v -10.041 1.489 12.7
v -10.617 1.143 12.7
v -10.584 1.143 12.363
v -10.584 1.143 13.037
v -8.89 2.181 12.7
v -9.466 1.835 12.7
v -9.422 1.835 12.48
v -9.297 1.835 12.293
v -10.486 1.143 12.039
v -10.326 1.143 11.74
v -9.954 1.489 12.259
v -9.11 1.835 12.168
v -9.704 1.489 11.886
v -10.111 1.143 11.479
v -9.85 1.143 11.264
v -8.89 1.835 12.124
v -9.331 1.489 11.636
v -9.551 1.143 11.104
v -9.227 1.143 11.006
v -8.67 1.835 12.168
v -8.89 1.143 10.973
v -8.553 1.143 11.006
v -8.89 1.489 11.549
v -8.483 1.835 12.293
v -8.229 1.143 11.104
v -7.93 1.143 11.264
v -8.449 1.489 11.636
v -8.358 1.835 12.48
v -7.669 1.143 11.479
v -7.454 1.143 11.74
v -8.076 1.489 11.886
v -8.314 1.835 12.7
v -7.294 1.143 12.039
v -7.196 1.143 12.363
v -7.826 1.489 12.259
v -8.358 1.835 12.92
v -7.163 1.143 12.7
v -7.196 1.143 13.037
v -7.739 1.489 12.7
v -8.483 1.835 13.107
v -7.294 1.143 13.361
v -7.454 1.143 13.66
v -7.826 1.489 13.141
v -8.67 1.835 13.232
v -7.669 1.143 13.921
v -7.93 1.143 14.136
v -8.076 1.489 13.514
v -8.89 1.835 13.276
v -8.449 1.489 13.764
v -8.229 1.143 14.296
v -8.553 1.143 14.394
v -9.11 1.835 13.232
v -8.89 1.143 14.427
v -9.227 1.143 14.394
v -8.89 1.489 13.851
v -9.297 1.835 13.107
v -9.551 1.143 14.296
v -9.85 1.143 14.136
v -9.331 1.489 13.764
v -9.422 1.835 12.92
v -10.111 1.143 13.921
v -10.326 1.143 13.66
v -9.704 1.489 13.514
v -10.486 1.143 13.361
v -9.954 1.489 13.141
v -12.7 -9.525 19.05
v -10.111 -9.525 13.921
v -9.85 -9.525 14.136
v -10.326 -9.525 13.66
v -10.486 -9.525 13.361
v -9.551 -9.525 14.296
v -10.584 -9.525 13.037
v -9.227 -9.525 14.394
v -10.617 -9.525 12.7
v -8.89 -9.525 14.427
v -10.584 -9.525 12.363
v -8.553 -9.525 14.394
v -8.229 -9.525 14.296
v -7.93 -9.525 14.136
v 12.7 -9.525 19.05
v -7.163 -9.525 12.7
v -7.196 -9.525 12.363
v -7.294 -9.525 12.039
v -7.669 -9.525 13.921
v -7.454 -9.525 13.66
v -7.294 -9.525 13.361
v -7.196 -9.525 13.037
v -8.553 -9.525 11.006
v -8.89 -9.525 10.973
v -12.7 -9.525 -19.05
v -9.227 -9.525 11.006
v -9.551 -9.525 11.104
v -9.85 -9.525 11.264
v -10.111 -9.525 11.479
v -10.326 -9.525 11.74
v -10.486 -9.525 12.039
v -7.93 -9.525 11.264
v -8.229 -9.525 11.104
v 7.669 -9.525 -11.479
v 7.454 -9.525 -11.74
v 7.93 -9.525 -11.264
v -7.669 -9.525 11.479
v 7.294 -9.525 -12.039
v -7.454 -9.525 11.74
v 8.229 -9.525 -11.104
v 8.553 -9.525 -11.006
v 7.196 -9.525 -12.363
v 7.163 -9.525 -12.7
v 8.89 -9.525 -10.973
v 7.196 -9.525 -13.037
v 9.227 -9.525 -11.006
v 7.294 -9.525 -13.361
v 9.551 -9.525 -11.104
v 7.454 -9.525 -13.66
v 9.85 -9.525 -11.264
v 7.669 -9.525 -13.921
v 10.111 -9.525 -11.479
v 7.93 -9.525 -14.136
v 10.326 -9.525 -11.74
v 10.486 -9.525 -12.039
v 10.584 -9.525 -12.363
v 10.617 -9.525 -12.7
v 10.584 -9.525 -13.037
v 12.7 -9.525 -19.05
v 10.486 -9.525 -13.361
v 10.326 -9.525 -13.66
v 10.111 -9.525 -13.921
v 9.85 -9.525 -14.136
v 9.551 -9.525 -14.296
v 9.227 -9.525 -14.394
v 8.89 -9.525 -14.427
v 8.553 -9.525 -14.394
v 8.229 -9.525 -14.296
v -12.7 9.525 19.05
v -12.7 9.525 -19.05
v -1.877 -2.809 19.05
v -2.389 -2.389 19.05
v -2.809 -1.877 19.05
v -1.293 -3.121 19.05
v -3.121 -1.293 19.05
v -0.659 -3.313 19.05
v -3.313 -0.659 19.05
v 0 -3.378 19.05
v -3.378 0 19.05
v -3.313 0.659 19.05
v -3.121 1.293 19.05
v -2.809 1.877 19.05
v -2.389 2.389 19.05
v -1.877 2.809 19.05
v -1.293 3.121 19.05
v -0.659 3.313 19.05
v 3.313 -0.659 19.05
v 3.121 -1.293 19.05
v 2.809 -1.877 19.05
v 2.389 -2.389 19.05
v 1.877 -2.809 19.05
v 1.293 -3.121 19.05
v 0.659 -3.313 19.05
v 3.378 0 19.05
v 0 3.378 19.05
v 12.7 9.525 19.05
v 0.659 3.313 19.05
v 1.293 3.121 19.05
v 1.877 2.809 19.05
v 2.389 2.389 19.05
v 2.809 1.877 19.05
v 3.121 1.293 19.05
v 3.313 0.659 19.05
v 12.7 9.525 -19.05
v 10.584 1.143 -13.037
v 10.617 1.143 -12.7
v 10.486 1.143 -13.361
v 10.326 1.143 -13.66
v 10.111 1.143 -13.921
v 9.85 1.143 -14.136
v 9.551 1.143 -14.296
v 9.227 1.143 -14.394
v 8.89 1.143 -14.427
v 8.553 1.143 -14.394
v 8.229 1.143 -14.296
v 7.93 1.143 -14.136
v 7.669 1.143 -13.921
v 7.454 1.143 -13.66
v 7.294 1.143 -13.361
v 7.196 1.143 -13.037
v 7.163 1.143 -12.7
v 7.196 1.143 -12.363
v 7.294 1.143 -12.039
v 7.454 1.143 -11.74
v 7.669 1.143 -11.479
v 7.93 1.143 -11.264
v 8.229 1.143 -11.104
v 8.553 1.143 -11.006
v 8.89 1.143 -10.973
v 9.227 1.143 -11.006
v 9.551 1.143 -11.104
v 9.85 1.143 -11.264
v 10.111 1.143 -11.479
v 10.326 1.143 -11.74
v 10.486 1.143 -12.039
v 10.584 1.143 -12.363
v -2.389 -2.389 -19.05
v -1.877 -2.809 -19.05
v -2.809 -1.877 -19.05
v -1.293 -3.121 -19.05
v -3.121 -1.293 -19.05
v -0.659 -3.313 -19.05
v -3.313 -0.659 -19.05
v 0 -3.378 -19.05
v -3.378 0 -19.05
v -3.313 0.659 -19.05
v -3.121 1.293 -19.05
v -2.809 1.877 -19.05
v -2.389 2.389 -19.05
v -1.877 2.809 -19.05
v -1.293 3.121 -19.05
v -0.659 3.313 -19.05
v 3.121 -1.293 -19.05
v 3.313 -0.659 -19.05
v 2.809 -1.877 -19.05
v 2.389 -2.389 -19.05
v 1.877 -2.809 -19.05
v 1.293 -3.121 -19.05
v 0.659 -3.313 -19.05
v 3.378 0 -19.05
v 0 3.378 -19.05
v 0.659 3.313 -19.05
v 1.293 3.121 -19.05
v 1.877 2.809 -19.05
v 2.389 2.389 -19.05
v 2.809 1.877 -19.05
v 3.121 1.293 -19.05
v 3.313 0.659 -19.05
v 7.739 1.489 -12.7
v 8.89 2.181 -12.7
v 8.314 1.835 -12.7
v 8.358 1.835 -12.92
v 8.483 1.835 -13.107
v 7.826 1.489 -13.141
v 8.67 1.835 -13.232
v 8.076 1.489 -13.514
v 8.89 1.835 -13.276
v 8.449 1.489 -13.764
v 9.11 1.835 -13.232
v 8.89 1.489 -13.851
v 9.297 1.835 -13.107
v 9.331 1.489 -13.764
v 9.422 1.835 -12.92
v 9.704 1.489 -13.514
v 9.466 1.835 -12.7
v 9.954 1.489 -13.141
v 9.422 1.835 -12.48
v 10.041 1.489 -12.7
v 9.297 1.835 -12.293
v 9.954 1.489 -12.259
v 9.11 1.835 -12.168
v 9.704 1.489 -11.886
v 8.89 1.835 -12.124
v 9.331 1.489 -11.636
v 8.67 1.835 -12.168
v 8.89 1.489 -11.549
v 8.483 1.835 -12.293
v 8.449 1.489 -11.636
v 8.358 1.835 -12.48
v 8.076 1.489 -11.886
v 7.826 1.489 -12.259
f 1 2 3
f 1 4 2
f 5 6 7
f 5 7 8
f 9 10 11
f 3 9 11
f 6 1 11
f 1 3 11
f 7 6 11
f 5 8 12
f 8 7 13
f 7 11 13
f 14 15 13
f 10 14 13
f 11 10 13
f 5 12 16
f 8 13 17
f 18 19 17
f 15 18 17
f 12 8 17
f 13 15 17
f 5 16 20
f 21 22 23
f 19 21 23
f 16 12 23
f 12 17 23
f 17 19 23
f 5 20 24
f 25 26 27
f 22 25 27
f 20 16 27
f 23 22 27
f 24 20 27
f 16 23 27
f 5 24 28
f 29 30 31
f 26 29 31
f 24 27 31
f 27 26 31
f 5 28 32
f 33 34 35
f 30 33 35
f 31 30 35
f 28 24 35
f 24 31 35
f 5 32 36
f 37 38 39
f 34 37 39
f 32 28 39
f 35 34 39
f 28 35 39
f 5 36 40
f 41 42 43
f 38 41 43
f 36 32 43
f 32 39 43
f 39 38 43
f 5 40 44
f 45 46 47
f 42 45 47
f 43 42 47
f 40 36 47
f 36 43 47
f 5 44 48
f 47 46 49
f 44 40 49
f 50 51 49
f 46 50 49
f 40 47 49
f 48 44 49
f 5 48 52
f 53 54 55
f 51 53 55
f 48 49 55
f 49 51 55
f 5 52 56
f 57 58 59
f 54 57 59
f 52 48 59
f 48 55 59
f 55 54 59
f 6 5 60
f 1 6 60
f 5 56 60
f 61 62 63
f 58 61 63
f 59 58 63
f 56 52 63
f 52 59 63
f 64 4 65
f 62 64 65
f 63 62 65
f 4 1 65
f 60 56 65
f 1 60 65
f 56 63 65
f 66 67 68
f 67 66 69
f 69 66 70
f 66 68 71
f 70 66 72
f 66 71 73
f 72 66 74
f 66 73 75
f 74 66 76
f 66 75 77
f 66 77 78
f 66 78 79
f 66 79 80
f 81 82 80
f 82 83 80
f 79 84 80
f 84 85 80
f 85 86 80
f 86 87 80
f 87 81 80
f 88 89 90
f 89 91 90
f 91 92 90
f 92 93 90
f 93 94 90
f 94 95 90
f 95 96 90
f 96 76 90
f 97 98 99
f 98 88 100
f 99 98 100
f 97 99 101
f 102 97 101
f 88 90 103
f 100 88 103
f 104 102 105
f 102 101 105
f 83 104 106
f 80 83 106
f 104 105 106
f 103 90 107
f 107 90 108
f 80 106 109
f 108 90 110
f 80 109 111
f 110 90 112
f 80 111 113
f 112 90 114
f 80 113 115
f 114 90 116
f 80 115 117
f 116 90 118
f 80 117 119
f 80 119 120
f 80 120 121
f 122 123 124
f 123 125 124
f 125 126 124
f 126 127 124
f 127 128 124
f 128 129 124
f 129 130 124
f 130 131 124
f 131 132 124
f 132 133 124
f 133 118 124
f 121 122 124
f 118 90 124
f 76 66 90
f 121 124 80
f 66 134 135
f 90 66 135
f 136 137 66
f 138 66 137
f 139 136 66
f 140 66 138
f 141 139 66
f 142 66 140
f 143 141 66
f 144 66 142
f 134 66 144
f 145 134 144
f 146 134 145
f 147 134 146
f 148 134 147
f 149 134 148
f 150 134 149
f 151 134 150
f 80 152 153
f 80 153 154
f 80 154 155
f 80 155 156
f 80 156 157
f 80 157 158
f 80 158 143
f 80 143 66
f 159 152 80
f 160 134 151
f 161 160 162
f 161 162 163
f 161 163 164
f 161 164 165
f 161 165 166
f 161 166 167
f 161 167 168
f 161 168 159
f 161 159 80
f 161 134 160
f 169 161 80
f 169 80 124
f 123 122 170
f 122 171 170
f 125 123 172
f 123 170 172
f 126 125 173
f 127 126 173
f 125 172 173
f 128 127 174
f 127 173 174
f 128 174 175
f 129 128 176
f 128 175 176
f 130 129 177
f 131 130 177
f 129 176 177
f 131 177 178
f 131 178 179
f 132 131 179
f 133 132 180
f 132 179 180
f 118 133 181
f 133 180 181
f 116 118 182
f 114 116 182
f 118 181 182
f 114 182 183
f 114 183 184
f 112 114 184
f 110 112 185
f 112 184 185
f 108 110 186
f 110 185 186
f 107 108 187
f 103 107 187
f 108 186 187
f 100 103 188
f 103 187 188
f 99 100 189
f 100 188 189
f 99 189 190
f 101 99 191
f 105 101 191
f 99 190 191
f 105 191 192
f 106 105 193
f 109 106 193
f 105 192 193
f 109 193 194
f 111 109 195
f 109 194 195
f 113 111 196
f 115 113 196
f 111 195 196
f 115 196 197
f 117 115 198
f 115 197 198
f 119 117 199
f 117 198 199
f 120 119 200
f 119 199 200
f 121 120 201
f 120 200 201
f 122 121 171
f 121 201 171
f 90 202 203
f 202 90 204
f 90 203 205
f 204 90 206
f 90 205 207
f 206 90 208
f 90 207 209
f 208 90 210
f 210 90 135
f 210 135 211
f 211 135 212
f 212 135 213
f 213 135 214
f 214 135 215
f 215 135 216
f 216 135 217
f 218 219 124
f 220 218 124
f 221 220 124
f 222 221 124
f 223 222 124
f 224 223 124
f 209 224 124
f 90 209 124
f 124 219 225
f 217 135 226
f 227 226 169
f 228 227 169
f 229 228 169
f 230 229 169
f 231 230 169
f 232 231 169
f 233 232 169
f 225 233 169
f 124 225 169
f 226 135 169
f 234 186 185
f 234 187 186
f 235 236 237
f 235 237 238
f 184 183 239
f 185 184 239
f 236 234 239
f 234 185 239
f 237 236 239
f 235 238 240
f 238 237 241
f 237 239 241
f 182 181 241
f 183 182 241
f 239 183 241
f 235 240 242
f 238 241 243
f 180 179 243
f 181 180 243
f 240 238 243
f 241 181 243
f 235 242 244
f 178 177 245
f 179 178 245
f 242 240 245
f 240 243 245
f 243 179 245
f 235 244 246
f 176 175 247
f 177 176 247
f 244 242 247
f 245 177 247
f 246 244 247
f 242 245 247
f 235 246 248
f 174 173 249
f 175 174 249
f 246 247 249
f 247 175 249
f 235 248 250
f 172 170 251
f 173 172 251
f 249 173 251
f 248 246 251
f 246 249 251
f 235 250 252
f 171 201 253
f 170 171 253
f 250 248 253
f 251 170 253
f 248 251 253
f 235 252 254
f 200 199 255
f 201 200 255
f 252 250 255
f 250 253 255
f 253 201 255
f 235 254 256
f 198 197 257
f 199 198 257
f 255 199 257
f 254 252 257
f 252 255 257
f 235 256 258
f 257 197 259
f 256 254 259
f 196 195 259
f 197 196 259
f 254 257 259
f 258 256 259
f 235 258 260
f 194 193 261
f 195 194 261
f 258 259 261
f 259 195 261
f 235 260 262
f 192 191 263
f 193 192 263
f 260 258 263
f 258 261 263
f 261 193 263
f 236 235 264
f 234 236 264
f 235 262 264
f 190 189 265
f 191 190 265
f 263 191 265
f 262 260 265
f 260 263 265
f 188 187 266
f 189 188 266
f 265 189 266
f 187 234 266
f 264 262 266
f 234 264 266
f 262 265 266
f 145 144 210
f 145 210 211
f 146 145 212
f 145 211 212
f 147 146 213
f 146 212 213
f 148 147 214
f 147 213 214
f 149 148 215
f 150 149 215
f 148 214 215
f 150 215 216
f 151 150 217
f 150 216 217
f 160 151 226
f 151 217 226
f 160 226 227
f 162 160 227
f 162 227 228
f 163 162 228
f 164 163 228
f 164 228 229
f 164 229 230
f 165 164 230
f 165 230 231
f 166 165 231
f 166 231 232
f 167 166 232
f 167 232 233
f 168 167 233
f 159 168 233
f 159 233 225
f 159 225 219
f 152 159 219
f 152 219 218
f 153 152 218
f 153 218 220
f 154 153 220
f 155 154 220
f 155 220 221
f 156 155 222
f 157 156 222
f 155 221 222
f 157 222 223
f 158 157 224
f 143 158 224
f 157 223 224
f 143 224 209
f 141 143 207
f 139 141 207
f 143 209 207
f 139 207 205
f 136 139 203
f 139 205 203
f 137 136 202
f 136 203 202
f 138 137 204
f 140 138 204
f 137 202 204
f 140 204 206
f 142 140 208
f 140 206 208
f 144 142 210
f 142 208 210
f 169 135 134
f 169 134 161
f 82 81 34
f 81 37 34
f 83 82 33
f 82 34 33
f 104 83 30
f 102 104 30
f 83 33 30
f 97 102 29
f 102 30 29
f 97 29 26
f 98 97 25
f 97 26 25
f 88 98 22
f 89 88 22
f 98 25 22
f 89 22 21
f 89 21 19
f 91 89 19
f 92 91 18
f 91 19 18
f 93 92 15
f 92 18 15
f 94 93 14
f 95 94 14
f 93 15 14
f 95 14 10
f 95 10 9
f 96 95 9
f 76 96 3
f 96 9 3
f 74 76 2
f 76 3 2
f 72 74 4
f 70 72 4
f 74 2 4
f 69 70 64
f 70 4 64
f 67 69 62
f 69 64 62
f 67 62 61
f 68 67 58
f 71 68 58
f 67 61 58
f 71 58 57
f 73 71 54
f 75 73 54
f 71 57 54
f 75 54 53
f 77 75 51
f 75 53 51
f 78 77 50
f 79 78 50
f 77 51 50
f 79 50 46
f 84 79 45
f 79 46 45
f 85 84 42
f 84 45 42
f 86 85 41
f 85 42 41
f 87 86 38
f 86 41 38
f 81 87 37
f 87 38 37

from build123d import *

# Parameters (mm, degrees)
SKETCH1_W                 = 25.4
SKETCH1_H                 = 38.1
BOSS_EXTRUDE1_DEPTH       = 9.525
F_1_4_CLEARANCE_HOLE1_D   = 6.7564
F_8_32_TAPPED_HOLE1_D     = 3.4544
F_8_32_TAPPED_HOLE1_DEPTH = 10.668
F_8_32_TAPPED_HOLE1_TIP   = 1.037806461


with BuildPart() as part:
    # Sketch1 → Boss-Extrude1 (new, symmetric)
    with BuildSketch(Plane(origin=(0, 0, 0), x_dir=(1, 0, 0), z_dir=(0, 1, 0))):
        Rectangle(SKETCH1_W, SKETCH1_H)
    extrude(amount=BOSS_EXTRUDE1_DEPTH, both=True)

    # 1/4 Clearance Hole1 (through all)
    with Locations(Plane.XY.offset(19.05)):
        with Locations((0, 0)):
            Hole(F_1_4_CLEARANCE_HOLE1_D / 2)

    # #8-32 Tapped Hole1
    with Locations(Plane(origin=(0, -9.525, 0), x_dir=(-1, 0, 0), z_dir=(0, -1, 0))):
        with Locations((8.89, -12.7), (-8.89, 12.7)):
            Hole(F_8_32_TAPPED_HOLE1_D / 2, depth=F_8_32_TAPPED_HOLE1_DEPTH)
            with Locations((0, 0, -(F_8_32_TAPPED_HOLE1_DEPTH + F_8_32_TAPPED_HOLE1_TIP / 2))):  # 118° drill point
                Cone(0, F_8_32_TAPPED_HOLE1_D / 2, F_8_32_TAPPED_HOLE1_TIP, mode=Mode.SUBTRACT)


solid = part.part
